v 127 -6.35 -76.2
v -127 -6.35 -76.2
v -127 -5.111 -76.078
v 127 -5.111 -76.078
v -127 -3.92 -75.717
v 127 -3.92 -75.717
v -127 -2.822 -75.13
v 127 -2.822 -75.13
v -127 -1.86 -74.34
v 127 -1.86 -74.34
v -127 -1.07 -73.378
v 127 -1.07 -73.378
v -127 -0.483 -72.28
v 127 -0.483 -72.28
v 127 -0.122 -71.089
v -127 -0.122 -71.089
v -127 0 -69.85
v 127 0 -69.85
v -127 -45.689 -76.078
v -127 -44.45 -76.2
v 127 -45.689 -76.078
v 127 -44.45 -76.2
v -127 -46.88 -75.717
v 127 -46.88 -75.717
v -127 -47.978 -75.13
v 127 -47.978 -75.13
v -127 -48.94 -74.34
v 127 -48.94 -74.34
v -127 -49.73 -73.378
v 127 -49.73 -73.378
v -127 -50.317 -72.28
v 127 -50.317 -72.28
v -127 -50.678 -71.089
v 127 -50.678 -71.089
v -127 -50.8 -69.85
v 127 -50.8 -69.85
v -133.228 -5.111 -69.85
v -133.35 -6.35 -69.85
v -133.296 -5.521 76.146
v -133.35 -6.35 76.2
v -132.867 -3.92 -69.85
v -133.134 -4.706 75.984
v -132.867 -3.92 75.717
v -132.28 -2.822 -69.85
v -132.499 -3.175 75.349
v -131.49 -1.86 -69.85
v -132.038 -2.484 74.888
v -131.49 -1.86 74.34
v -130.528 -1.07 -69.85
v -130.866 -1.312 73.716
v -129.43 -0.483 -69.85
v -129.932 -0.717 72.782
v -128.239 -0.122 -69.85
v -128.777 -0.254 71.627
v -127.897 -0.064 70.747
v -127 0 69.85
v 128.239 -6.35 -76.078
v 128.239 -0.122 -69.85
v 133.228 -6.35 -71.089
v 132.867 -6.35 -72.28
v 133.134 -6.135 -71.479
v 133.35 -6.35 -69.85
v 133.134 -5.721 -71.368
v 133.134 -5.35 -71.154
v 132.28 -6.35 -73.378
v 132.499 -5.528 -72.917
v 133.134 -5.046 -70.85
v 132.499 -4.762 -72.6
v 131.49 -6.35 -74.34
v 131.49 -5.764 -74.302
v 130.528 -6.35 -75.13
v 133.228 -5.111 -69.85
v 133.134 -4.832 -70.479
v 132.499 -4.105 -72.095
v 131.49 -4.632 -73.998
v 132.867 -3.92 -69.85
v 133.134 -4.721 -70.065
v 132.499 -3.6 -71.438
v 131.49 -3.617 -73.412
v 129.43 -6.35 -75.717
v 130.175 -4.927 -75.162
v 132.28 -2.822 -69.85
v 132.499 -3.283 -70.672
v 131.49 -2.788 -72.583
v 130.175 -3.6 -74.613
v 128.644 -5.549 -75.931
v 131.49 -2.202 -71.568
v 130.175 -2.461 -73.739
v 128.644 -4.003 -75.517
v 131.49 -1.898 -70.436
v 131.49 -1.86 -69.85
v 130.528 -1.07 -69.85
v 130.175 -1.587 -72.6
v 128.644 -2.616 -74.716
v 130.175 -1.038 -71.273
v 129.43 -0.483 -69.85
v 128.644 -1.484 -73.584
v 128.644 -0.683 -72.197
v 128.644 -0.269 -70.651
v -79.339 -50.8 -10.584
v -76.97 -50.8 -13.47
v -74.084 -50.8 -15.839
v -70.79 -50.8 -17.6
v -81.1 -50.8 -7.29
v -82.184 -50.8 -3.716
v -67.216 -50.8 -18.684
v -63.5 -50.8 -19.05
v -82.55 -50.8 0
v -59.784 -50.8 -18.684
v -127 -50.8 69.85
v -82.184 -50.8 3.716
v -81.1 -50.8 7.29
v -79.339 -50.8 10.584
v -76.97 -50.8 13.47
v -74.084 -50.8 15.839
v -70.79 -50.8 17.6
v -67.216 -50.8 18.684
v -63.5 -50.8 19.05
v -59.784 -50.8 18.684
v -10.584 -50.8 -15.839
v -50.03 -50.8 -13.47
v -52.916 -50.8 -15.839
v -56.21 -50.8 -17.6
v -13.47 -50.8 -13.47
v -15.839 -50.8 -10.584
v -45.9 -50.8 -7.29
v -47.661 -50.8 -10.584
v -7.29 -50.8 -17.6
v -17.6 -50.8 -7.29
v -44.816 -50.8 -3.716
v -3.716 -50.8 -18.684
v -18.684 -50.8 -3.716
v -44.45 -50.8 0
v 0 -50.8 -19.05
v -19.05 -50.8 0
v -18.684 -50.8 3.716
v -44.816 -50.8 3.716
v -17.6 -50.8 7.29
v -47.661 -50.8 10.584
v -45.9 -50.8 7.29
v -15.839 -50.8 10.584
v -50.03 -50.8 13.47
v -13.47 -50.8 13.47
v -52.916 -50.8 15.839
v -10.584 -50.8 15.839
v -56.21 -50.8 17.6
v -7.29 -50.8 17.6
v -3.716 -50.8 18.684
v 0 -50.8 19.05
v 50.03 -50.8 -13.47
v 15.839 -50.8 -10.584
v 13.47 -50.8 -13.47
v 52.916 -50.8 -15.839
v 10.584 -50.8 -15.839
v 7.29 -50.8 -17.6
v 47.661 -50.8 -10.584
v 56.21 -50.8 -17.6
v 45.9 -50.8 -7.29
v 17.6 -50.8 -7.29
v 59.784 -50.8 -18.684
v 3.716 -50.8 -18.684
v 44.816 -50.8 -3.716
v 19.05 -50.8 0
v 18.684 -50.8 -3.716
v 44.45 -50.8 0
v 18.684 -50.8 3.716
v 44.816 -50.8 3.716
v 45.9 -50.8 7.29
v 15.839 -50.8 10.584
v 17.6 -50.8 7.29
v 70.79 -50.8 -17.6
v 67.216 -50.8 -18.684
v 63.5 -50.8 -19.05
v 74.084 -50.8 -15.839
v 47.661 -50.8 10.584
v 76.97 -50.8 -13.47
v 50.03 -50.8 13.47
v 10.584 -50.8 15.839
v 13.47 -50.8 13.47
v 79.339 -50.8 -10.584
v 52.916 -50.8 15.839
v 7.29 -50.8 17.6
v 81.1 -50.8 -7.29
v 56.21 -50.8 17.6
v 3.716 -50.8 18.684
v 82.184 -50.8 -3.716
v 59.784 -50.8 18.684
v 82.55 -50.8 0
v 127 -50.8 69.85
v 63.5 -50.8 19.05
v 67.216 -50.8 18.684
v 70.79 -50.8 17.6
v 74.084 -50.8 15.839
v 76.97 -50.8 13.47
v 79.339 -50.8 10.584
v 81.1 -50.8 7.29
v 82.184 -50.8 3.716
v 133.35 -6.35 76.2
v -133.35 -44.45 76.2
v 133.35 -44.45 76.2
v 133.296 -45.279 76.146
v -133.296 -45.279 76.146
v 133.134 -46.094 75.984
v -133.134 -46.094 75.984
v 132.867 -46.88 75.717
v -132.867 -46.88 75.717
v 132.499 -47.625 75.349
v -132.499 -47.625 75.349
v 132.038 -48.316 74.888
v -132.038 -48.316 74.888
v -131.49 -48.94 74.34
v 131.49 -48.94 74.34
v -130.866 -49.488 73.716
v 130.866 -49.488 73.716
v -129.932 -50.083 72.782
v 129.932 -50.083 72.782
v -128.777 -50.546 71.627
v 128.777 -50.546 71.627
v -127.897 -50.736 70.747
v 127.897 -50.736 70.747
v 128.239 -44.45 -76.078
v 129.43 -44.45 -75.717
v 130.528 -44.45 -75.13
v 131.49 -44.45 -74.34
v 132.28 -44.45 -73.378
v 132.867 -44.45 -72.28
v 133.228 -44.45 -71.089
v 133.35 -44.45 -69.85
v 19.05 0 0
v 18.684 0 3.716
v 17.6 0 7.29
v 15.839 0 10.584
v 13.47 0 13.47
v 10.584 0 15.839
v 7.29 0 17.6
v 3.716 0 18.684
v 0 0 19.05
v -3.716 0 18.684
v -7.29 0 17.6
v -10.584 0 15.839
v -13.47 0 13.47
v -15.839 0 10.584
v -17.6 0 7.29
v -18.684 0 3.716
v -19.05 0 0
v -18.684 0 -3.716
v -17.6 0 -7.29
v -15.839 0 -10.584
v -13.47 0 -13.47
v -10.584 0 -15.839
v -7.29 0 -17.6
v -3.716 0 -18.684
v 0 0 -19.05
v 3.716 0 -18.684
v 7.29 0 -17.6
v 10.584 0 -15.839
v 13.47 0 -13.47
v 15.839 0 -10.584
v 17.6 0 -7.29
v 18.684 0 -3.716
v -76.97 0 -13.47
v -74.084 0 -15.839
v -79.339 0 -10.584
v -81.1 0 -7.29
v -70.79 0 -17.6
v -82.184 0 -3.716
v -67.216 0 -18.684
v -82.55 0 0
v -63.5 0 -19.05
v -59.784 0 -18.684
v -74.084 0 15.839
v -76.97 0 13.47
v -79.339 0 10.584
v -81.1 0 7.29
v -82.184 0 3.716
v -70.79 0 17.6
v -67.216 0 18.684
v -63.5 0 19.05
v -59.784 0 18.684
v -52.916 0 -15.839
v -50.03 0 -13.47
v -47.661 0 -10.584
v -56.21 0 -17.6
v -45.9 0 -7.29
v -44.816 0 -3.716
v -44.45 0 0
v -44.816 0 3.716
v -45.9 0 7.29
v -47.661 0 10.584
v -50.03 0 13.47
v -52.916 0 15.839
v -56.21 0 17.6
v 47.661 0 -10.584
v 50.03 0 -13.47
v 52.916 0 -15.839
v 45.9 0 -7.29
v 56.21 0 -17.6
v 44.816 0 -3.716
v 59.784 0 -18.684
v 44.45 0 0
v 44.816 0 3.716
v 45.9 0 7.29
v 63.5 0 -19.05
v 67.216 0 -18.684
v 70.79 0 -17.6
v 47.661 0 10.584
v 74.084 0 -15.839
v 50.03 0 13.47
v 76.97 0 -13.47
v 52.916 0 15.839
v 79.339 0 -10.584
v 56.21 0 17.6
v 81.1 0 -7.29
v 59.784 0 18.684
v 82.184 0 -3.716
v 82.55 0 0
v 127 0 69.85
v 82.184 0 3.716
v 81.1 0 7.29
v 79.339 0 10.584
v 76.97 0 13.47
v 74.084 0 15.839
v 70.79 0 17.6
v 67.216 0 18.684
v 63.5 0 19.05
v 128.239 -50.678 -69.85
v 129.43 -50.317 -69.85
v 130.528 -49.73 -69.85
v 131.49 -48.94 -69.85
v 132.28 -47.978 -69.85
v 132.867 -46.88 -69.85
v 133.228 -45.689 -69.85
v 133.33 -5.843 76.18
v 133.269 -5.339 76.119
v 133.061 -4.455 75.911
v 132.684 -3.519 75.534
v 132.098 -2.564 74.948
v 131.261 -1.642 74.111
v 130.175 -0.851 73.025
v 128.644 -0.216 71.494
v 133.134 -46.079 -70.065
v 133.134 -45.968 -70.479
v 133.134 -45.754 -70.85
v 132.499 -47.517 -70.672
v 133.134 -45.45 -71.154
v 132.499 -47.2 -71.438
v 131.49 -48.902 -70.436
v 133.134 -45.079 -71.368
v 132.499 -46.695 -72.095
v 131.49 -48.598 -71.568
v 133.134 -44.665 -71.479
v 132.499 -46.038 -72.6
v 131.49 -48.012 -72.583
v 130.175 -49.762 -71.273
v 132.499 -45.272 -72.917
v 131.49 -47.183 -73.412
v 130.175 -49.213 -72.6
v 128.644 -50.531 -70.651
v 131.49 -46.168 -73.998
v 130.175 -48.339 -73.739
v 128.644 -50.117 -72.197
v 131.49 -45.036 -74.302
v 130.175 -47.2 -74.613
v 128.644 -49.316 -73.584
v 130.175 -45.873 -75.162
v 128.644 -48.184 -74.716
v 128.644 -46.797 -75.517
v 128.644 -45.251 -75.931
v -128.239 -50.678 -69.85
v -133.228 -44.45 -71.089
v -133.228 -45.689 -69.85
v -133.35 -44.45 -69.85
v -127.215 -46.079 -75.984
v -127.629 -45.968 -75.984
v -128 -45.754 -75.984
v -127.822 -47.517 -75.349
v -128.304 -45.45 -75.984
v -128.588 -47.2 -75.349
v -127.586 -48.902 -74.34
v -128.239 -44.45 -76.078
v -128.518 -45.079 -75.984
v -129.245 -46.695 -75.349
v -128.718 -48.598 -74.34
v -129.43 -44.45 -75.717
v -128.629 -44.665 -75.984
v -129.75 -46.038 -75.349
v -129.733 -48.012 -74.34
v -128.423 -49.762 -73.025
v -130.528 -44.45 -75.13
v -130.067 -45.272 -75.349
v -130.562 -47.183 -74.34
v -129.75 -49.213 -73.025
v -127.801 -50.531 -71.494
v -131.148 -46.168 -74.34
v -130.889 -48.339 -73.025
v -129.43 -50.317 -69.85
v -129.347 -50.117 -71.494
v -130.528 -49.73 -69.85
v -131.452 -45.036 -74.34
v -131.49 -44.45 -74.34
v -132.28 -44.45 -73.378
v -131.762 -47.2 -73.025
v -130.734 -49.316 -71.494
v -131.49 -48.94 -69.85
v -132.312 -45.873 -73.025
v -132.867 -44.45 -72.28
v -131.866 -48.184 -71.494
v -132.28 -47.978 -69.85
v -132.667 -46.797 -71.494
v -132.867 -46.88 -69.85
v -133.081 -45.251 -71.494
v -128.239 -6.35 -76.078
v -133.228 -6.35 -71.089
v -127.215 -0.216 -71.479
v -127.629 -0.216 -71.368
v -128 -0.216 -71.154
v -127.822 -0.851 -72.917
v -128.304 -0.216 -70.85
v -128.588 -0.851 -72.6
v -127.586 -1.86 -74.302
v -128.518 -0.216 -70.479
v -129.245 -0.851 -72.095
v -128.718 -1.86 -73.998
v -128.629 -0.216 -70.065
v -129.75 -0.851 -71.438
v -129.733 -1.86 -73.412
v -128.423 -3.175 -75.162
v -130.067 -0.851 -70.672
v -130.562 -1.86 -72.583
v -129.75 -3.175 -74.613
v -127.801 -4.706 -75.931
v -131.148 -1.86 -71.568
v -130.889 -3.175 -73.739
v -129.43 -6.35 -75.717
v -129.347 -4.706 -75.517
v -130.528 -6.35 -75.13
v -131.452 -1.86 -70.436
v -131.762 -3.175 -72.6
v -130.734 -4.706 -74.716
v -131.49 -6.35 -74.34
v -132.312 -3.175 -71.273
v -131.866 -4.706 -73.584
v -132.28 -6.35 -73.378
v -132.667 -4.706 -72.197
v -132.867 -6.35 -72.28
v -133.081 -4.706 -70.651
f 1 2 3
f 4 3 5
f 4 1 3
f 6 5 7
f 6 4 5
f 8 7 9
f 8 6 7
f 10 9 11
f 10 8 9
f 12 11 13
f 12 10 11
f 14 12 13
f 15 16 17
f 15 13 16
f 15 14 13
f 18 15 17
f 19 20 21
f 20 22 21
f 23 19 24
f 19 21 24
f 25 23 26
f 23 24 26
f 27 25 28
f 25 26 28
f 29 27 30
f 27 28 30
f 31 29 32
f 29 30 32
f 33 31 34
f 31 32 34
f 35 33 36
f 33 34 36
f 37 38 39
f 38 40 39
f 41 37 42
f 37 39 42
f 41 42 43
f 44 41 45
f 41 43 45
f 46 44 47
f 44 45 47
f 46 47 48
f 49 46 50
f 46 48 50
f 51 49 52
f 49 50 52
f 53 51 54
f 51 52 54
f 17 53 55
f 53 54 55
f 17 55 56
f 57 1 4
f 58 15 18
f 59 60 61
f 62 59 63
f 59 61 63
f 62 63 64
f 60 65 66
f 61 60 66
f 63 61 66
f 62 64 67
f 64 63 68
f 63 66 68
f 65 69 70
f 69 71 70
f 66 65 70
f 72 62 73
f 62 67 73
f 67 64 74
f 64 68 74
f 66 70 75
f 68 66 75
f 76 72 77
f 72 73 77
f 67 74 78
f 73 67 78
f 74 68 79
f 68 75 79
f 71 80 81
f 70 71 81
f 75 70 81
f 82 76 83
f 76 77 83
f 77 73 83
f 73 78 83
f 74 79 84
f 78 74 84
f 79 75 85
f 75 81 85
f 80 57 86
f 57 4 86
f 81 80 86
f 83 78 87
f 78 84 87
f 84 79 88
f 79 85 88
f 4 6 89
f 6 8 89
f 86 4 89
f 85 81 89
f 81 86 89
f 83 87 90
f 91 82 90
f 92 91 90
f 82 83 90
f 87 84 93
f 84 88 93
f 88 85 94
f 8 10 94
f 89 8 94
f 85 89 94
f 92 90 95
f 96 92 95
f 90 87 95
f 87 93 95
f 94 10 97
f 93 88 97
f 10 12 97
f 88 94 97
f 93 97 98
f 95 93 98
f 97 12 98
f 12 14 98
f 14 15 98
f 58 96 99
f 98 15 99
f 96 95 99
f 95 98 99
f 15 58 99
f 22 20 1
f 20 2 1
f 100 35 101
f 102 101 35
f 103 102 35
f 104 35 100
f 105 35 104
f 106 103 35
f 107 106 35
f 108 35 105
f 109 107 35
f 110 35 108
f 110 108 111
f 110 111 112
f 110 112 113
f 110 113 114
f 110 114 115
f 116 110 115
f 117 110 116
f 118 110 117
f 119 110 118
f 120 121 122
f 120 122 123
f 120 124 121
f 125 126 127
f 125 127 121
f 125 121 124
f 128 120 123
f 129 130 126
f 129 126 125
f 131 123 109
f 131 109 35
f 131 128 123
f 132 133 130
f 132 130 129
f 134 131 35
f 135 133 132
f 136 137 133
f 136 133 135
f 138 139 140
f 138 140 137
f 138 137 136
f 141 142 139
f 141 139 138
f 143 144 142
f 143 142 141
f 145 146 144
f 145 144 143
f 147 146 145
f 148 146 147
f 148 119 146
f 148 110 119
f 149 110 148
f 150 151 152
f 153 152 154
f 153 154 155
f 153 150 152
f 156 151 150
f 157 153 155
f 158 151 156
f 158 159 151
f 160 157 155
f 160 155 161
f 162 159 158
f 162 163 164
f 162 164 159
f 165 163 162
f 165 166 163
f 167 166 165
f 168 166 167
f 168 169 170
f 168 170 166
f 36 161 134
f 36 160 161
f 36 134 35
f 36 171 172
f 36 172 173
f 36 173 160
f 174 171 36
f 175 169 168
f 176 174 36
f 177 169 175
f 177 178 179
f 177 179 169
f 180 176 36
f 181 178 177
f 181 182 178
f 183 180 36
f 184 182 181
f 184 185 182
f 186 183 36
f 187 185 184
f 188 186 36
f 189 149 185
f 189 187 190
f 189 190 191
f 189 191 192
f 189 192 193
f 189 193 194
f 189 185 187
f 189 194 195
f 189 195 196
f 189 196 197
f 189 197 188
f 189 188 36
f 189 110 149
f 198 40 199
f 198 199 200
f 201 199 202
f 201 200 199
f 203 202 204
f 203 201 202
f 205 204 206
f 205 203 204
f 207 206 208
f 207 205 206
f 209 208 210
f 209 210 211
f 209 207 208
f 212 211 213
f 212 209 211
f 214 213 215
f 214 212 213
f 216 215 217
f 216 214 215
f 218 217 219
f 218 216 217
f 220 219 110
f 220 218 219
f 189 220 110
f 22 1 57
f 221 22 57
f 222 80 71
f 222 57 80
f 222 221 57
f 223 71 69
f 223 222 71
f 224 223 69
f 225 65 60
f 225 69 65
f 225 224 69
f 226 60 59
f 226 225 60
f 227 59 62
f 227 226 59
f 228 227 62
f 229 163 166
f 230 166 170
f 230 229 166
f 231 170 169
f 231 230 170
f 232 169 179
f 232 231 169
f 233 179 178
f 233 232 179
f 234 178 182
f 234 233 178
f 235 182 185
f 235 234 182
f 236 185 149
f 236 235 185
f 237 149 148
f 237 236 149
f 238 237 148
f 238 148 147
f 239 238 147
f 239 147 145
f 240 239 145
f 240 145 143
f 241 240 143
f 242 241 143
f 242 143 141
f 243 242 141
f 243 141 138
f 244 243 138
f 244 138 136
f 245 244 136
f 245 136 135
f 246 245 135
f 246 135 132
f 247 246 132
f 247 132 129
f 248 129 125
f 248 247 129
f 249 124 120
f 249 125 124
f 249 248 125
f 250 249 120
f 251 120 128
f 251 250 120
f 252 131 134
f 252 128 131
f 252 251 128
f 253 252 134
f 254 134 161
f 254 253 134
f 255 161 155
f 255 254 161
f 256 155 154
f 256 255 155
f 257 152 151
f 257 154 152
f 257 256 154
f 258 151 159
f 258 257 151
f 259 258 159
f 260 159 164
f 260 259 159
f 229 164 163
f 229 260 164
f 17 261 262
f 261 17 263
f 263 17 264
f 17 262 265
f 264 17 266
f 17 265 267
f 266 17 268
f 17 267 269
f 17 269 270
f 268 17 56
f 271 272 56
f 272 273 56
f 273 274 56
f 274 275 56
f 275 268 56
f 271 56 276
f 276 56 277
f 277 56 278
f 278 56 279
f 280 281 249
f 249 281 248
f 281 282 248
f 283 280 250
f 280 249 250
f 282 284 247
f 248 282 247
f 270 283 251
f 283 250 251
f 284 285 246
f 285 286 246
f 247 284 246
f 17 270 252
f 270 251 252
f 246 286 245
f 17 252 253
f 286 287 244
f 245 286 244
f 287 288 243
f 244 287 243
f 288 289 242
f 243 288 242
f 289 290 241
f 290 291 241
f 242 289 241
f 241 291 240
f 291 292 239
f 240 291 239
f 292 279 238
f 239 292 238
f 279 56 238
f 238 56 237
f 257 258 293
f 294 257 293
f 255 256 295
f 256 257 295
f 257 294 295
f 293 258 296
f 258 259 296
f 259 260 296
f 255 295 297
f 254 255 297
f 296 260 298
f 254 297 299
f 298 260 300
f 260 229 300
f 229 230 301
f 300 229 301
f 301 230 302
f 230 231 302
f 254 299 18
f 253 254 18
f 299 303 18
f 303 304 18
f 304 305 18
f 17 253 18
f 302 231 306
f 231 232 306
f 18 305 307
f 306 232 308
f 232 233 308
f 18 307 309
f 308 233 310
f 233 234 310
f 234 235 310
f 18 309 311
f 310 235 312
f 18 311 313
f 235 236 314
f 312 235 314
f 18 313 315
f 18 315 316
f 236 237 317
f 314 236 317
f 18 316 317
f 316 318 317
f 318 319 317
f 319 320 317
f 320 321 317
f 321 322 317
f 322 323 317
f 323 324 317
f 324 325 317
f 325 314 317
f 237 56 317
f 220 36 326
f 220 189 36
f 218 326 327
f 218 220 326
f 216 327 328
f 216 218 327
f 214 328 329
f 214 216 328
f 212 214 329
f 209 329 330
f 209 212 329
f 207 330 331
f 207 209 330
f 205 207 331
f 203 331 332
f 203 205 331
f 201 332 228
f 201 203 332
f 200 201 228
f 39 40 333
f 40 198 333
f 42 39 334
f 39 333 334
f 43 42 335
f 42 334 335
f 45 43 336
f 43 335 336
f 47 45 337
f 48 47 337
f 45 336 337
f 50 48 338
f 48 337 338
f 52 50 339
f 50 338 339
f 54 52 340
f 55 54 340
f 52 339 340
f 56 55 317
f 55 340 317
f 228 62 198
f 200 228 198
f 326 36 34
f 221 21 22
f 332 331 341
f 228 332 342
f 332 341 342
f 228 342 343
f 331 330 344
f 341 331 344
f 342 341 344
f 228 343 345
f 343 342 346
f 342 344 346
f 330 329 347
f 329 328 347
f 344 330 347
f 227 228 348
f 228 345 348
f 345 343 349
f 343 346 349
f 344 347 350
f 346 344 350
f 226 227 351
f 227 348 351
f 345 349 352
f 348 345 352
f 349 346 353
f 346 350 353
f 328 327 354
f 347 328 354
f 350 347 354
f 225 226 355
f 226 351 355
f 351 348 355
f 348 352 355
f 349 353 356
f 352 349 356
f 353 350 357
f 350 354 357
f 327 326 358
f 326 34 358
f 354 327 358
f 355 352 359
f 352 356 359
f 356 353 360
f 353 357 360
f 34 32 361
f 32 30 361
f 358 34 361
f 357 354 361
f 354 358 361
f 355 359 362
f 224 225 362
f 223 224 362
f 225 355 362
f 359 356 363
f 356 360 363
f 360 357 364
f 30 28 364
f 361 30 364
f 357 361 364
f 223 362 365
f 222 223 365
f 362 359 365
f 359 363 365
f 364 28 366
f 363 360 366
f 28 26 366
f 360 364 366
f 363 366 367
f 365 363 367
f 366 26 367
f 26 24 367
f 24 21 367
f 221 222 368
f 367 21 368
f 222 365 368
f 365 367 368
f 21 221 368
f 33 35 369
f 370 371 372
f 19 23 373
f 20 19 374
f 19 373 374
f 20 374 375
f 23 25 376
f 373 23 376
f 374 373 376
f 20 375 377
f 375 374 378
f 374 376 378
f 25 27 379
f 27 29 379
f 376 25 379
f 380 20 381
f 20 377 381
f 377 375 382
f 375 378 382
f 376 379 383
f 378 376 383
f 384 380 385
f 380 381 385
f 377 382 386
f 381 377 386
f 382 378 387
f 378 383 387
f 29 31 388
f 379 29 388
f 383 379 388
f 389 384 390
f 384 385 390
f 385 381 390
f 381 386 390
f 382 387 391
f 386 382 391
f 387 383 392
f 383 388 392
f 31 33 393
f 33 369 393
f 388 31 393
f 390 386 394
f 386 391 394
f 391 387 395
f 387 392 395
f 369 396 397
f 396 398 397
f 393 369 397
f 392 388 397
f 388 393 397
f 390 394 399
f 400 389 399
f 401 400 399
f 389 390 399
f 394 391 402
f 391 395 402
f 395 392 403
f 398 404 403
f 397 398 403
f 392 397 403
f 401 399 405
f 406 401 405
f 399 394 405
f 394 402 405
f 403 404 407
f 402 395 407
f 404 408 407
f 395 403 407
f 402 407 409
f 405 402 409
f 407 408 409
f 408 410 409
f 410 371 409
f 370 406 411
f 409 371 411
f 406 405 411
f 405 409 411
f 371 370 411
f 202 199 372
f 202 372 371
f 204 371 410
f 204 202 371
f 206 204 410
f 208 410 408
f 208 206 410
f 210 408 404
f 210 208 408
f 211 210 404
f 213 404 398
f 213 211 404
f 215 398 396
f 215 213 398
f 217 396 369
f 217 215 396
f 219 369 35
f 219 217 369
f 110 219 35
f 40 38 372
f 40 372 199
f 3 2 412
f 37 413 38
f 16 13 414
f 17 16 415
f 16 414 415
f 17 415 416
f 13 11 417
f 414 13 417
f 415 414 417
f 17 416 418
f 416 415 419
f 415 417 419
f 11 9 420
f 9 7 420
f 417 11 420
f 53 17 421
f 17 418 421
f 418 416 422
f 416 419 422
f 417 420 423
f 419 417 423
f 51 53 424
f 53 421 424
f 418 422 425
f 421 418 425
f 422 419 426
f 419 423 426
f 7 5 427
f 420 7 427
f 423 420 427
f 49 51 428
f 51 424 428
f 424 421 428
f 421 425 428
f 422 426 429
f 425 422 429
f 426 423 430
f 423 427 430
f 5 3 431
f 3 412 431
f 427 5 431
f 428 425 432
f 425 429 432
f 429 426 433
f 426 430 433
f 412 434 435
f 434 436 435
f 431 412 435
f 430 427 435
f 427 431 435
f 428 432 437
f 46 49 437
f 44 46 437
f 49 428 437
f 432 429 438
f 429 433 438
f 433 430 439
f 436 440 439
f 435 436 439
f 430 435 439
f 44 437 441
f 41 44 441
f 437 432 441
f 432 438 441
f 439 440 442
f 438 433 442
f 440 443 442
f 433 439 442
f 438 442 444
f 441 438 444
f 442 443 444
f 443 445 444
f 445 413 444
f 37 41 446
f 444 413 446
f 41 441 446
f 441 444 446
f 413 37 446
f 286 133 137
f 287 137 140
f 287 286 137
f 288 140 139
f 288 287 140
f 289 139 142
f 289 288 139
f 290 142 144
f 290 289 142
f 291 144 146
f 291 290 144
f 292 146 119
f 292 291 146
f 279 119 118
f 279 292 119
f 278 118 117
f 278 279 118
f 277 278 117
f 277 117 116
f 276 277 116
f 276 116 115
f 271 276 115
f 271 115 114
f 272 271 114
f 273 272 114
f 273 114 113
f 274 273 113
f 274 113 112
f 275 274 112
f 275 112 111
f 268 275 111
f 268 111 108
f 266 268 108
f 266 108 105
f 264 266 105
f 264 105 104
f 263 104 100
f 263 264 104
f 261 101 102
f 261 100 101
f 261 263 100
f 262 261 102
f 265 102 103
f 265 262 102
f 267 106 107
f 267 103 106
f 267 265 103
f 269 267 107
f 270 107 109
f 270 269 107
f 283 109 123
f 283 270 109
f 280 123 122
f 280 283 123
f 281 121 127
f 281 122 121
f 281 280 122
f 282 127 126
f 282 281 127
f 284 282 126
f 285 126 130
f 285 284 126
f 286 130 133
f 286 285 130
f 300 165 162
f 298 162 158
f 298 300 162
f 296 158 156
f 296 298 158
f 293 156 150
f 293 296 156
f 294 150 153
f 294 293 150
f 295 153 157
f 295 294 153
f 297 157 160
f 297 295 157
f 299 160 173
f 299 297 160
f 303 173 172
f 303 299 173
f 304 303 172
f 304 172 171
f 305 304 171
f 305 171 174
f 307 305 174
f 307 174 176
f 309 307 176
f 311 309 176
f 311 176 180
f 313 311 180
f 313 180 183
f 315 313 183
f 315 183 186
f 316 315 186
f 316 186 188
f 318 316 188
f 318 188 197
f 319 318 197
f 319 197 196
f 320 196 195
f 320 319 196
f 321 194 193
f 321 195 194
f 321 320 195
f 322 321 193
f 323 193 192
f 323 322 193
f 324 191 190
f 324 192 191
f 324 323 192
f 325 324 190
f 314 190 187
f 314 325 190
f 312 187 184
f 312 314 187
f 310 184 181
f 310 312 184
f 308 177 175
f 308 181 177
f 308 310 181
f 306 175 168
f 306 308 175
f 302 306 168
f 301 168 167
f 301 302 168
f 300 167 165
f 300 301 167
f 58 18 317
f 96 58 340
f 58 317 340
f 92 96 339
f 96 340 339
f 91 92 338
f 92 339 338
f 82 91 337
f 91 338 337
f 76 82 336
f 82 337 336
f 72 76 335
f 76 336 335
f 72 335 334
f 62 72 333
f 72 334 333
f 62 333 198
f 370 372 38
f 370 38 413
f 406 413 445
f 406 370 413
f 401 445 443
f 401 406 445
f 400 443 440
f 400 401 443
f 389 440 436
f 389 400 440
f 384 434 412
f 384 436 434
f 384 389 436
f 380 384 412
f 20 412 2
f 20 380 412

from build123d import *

# Parameters (mm, degrees)
F0_W     = 266.7
F0_H     = 152.4
F1_DEPTH = 50.8
F2_R     = 19.05
F3_DEPTH = 50.801
F4_R     = 19.05
F5_DEPTH = 50.801
F6_R     = 6.35


with BuildPart() as f1:
    # F0 (on Front) → F1 (new body)
    with BuildSketch(Plane.XZ):
        Rectangle(F0_W, F0_H)
    extrude(amount=F1_DEPTH)

    # F2 (on Front) → F3 (cut, through all)
    with BuildSketch(Plane.XZ):
        Circle(F2_R)
    extrude(amount=F3_DEPTH, mode=Mode.SUBTRACT)

    # F4 (on Front) → F5 (cut, through all)
    with BuildSketch(Plane.XZ):
        with Locations((-63.5, 0)):
            Circle(F4_R)
        with BuildLine():
            ThreePointArc((82.55, 0), (63.5, 19.05), (44.45, 0))
            ThreePointArc((44.45, 0), (63.5, -19.05), (82.55, 0))
        make_face()
    extrude(amount=F5_DEPTH, mode=Mode.SUBTRACT)

    # F6
    f6_edges = [f1.edges().sort_by_distance(p)[0] for p in [
        (-133.35, -50.8, 0),
        (0, -50.8, -76.2),
        (0, -50.8, 76.2),
        (133.35, -50.8, 0),
        (-133.35, -25.4, -76.2),
        (0, 0, -76.2),
        (-133.35, 0, 0),
        (133.35, -25.4, -76.2),
        (133.35, 0, 0),
        (0, 0, 76.2),
    ]]
    fillet(f6_edges, radius=F6_R)


solid = f1.part
